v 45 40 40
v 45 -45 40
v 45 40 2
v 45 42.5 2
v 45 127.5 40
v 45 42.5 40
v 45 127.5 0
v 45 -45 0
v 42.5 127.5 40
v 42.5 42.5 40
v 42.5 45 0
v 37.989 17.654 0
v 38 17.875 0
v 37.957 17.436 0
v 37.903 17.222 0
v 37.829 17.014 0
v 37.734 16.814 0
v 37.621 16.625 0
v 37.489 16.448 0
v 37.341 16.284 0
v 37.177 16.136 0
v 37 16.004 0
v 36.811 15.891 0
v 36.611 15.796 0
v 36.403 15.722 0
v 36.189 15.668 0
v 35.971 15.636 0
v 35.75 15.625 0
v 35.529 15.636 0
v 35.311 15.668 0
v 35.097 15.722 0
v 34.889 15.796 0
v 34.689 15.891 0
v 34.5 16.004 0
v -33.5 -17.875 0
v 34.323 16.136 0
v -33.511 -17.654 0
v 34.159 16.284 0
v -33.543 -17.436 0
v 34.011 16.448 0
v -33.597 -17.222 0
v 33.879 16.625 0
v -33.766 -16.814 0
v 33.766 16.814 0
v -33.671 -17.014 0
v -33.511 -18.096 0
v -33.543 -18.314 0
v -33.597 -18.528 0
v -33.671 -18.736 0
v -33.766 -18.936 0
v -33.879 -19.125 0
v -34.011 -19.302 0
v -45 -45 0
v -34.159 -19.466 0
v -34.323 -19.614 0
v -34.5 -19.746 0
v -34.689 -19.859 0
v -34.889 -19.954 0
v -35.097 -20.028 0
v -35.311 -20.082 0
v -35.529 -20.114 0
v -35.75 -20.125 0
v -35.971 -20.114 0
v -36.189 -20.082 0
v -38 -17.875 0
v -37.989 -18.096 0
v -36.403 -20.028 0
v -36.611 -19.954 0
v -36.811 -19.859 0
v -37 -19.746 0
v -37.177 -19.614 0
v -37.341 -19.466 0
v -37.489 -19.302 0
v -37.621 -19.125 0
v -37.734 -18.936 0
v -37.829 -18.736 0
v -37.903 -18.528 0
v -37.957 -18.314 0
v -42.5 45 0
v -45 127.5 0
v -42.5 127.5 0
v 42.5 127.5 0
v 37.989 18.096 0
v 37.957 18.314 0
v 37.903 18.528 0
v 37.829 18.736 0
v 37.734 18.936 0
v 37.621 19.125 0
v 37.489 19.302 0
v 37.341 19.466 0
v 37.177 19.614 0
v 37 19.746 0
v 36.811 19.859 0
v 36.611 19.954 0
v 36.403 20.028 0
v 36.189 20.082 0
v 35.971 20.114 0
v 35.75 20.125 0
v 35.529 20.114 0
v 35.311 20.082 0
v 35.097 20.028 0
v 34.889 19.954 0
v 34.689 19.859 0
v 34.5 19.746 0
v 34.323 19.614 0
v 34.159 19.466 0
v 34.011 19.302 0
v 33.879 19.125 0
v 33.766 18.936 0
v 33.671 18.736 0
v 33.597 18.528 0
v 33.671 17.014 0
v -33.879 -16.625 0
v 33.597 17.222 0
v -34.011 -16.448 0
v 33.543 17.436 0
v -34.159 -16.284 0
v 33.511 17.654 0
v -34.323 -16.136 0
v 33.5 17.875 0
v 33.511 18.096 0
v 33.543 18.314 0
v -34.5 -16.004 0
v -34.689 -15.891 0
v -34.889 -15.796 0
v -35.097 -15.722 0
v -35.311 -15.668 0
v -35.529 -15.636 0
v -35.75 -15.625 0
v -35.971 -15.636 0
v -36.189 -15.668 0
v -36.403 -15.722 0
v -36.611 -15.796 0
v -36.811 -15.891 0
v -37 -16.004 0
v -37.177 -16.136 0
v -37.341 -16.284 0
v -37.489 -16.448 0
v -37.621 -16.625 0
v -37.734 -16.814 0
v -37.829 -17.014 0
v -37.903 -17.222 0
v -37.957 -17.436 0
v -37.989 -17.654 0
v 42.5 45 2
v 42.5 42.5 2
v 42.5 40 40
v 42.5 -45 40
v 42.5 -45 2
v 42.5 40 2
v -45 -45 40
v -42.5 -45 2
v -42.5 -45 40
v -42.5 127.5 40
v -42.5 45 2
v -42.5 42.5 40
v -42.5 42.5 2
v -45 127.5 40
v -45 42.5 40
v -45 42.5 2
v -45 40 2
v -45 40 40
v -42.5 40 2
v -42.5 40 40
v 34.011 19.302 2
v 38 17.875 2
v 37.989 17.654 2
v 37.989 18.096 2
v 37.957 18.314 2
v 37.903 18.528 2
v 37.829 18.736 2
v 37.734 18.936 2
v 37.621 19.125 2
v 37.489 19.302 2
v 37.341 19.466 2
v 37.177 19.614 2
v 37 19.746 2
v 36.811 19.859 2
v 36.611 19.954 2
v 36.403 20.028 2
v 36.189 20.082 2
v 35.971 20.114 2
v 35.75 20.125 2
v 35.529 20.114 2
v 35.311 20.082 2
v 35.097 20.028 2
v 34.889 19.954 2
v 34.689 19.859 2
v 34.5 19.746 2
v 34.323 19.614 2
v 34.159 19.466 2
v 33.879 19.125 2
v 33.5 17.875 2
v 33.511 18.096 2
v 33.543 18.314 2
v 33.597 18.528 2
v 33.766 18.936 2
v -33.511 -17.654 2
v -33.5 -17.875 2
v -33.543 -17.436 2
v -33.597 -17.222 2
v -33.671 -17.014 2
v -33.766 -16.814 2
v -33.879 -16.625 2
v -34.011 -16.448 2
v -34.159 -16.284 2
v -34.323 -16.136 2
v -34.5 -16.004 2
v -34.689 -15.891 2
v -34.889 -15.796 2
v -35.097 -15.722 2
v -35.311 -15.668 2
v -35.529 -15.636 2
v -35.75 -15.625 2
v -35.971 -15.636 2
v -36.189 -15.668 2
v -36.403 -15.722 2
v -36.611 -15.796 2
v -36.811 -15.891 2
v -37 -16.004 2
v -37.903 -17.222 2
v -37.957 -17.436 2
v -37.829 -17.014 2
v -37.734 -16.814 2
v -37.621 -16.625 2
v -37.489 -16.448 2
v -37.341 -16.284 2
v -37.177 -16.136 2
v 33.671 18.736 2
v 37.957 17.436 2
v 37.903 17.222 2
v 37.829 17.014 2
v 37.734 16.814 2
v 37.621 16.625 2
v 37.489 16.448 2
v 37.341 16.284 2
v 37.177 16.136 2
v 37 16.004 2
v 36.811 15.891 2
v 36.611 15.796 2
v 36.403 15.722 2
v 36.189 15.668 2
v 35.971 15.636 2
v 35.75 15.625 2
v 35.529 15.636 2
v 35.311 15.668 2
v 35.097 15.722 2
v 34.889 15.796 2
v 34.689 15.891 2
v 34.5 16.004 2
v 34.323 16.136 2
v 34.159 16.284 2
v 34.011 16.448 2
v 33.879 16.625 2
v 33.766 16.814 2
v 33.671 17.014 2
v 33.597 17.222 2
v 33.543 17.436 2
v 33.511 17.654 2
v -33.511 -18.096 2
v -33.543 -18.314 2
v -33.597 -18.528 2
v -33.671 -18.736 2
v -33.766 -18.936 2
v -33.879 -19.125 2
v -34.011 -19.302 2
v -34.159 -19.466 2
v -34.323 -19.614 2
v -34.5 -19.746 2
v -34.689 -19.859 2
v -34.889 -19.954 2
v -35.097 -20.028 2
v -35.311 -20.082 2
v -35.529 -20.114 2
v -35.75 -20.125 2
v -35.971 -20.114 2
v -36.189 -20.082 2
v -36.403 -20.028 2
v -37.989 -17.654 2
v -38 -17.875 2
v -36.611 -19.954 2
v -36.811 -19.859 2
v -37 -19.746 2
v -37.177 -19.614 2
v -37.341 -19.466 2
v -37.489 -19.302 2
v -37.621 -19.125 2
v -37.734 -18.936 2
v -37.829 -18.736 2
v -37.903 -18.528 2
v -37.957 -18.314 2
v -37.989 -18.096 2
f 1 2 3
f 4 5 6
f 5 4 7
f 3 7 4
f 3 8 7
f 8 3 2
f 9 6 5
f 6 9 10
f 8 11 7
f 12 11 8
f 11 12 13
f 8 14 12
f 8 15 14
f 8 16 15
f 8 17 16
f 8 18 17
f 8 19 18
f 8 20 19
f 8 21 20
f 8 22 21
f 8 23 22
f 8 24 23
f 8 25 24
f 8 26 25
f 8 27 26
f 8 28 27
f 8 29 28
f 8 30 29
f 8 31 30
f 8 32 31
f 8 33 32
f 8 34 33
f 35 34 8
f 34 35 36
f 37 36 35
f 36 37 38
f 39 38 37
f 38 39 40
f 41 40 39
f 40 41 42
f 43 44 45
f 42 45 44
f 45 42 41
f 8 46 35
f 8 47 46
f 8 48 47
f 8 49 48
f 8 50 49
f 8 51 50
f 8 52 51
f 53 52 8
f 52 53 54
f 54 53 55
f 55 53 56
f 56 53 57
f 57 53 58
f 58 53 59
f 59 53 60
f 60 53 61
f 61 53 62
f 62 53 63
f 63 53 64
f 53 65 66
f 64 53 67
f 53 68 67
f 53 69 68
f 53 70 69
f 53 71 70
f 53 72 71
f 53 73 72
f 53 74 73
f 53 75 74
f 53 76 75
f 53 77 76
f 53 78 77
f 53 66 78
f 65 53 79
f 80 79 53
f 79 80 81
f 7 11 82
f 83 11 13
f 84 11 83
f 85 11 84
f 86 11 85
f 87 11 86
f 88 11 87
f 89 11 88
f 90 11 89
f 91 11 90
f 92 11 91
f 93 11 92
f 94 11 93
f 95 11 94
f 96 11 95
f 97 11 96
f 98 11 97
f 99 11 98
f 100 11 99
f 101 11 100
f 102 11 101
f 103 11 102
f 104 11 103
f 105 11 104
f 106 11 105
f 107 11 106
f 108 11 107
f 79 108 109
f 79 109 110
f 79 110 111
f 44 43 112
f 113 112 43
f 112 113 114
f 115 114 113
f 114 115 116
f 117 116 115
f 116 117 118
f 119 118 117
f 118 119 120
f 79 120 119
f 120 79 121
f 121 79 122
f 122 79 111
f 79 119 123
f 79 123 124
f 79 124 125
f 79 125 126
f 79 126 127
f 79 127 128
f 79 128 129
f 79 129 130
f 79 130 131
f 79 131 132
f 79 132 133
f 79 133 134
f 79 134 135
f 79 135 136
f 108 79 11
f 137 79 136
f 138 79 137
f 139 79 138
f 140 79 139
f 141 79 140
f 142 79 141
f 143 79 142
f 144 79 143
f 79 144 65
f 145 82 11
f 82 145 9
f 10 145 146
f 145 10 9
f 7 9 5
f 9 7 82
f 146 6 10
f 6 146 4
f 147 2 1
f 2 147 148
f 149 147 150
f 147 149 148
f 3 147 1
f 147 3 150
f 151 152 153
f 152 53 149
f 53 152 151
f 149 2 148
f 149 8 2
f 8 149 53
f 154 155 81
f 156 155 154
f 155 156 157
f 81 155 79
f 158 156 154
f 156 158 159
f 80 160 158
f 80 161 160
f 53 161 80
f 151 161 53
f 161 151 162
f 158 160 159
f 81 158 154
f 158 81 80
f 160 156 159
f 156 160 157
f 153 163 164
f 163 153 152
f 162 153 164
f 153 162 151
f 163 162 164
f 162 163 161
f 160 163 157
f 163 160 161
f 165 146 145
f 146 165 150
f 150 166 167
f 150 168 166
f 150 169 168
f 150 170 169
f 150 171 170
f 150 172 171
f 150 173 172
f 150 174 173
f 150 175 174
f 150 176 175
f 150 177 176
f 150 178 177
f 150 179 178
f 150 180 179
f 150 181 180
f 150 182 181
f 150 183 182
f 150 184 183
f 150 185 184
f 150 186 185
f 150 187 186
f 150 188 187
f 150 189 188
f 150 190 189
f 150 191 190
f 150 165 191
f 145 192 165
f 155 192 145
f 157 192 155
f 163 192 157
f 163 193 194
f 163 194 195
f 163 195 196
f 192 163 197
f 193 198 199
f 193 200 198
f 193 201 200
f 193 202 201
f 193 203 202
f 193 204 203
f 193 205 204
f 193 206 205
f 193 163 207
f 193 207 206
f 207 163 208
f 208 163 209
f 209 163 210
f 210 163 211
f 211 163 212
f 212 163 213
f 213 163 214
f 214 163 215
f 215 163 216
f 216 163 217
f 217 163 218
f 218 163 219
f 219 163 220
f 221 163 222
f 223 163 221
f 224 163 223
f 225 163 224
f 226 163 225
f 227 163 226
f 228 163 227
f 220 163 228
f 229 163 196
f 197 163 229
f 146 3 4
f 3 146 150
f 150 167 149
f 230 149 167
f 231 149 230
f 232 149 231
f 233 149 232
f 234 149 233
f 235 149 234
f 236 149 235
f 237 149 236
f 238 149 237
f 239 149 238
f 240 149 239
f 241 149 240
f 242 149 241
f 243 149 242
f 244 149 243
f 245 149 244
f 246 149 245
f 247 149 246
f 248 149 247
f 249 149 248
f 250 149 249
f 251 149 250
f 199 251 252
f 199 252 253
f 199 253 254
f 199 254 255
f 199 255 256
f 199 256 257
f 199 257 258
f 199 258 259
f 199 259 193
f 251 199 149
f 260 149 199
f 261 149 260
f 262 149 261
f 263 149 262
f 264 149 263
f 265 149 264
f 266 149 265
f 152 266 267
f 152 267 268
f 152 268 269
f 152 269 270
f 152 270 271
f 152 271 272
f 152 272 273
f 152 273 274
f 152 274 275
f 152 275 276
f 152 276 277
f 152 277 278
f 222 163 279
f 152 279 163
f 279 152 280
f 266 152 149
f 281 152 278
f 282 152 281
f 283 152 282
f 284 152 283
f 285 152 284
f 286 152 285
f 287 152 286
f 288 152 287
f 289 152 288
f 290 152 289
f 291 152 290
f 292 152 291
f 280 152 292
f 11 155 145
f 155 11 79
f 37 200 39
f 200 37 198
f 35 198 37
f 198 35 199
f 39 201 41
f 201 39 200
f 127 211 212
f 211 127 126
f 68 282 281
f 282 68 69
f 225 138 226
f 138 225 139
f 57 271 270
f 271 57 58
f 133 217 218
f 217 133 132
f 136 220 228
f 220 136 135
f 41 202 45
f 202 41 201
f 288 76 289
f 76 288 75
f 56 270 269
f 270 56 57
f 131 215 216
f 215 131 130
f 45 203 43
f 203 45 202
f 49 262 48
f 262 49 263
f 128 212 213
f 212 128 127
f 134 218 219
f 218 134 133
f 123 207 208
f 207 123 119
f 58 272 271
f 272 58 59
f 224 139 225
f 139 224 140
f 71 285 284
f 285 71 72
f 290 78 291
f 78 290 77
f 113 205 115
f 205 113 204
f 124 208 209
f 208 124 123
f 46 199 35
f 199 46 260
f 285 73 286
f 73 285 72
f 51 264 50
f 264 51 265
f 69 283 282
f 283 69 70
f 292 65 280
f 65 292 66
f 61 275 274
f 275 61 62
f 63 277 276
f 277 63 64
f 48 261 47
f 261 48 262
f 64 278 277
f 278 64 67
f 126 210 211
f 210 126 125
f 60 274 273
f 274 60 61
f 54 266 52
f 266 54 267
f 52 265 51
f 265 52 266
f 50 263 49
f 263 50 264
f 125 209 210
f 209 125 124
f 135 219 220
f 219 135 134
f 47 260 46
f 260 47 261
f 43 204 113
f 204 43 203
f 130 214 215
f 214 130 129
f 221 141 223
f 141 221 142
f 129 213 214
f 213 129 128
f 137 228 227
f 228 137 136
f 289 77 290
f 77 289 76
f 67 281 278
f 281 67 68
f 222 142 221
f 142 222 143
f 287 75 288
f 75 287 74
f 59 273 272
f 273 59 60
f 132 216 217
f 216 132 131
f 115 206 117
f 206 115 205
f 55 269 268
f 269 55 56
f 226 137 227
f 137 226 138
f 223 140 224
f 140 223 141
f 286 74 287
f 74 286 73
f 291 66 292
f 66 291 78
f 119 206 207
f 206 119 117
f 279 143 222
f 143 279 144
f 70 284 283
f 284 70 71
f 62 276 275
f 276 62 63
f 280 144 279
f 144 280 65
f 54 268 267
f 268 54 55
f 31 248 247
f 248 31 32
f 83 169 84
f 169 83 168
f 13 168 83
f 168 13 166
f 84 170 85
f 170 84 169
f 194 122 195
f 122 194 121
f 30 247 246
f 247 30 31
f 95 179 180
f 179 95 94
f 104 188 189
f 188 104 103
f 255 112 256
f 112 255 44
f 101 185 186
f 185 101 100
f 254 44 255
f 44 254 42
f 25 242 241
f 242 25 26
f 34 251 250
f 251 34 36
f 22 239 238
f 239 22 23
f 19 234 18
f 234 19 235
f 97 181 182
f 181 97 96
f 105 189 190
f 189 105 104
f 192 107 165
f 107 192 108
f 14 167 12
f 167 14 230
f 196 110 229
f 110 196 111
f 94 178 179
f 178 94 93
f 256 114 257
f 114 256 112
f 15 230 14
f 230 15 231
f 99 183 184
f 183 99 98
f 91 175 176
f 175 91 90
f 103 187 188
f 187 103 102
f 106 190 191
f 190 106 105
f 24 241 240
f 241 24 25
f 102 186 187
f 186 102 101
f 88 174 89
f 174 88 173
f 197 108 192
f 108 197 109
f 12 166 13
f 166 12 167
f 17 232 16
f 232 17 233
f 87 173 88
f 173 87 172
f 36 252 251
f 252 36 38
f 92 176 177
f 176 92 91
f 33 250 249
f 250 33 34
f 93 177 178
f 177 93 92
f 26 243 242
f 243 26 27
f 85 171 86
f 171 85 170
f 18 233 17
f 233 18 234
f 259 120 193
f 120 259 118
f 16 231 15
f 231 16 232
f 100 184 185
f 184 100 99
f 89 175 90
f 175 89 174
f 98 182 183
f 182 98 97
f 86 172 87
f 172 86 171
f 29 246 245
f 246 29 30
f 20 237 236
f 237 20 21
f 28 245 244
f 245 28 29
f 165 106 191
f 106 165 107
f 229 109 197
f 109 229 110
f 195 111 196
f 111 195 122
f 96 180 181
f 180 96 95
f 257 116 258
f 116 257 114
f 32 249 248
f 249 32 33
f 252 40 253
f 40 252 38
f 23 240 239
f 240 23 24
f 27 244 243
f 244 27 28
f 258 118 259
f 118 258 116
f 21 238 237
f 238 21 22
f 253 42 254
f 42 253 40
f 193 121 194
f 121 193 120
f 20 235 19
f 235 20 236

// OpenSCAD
// DIY magnetic stirrer housing for 80 mm PC case fan
// Print orientation: top plate down on bed (z = 0), walls build upward (+Z)

$fn = 64;

// ---- Dimensions (mm) ----
plate_t      = 2;     // top plate thickness
wall_t       = 2.5;   // wall thickness
box_h        = 40;    // outer height of box (top of walls)
outer_x      = 90;    // outer size in X
outer_y      = 90;    // outer size in Y
hole_d       = 4.5;   // screw hole diameter (M4)
hole_pitch   = 71.5;  // square pattern pitch for screw holes
notch_w      = 12;    // cable notch width
notch_depth  = 8;     // cable notch depth from open edge (z = 32 to 40)
eps          = 0.5;   // cutter overshoot past faces

// ---- Model ----
difference() {
    union() {
        // Top plate (lies on z = 0)
        translate([-outer_x / 2, -outer_y / 2, 0])
            cube([outer_x, outer_y, plate_t]);

        // Four walls rising from plate to z = box_h
        for (sx = [-1, 1], sy = [-1, 1])
            translate([sx > 0 ? -outer_x / 2 : outer_x / 2 - wall_t,
                       sy > 0 ? -outer_y / 2 : outer_y / 2 - wall_t,
                       0])
                cube([wall_t, outer_y - 2 * wall_t, box_h]);
    }

    // Screw holes through top plate on 71.5 mm square pattern
    for (i = [0 : 3]) {
        x = (i % 2 - 0.5) * hole_pitch;
        y = (i / 2 - 0.25) * hole_pitch;
        translate([x, y, -eps])
            cylinder(d = hole_d, h = plate_t + 2 * eps);
    }

    // Cable notch in one wall: 12 mm wide, centred, from z = 32 to 40
    translate([-outer_x / 2 + (outer_x / 2 - wall_t) / 2, 0, box_h - notch_depth])
        cube([notch_w, outer_y - 2 * wall_t, notch_depth + eps]);
}
